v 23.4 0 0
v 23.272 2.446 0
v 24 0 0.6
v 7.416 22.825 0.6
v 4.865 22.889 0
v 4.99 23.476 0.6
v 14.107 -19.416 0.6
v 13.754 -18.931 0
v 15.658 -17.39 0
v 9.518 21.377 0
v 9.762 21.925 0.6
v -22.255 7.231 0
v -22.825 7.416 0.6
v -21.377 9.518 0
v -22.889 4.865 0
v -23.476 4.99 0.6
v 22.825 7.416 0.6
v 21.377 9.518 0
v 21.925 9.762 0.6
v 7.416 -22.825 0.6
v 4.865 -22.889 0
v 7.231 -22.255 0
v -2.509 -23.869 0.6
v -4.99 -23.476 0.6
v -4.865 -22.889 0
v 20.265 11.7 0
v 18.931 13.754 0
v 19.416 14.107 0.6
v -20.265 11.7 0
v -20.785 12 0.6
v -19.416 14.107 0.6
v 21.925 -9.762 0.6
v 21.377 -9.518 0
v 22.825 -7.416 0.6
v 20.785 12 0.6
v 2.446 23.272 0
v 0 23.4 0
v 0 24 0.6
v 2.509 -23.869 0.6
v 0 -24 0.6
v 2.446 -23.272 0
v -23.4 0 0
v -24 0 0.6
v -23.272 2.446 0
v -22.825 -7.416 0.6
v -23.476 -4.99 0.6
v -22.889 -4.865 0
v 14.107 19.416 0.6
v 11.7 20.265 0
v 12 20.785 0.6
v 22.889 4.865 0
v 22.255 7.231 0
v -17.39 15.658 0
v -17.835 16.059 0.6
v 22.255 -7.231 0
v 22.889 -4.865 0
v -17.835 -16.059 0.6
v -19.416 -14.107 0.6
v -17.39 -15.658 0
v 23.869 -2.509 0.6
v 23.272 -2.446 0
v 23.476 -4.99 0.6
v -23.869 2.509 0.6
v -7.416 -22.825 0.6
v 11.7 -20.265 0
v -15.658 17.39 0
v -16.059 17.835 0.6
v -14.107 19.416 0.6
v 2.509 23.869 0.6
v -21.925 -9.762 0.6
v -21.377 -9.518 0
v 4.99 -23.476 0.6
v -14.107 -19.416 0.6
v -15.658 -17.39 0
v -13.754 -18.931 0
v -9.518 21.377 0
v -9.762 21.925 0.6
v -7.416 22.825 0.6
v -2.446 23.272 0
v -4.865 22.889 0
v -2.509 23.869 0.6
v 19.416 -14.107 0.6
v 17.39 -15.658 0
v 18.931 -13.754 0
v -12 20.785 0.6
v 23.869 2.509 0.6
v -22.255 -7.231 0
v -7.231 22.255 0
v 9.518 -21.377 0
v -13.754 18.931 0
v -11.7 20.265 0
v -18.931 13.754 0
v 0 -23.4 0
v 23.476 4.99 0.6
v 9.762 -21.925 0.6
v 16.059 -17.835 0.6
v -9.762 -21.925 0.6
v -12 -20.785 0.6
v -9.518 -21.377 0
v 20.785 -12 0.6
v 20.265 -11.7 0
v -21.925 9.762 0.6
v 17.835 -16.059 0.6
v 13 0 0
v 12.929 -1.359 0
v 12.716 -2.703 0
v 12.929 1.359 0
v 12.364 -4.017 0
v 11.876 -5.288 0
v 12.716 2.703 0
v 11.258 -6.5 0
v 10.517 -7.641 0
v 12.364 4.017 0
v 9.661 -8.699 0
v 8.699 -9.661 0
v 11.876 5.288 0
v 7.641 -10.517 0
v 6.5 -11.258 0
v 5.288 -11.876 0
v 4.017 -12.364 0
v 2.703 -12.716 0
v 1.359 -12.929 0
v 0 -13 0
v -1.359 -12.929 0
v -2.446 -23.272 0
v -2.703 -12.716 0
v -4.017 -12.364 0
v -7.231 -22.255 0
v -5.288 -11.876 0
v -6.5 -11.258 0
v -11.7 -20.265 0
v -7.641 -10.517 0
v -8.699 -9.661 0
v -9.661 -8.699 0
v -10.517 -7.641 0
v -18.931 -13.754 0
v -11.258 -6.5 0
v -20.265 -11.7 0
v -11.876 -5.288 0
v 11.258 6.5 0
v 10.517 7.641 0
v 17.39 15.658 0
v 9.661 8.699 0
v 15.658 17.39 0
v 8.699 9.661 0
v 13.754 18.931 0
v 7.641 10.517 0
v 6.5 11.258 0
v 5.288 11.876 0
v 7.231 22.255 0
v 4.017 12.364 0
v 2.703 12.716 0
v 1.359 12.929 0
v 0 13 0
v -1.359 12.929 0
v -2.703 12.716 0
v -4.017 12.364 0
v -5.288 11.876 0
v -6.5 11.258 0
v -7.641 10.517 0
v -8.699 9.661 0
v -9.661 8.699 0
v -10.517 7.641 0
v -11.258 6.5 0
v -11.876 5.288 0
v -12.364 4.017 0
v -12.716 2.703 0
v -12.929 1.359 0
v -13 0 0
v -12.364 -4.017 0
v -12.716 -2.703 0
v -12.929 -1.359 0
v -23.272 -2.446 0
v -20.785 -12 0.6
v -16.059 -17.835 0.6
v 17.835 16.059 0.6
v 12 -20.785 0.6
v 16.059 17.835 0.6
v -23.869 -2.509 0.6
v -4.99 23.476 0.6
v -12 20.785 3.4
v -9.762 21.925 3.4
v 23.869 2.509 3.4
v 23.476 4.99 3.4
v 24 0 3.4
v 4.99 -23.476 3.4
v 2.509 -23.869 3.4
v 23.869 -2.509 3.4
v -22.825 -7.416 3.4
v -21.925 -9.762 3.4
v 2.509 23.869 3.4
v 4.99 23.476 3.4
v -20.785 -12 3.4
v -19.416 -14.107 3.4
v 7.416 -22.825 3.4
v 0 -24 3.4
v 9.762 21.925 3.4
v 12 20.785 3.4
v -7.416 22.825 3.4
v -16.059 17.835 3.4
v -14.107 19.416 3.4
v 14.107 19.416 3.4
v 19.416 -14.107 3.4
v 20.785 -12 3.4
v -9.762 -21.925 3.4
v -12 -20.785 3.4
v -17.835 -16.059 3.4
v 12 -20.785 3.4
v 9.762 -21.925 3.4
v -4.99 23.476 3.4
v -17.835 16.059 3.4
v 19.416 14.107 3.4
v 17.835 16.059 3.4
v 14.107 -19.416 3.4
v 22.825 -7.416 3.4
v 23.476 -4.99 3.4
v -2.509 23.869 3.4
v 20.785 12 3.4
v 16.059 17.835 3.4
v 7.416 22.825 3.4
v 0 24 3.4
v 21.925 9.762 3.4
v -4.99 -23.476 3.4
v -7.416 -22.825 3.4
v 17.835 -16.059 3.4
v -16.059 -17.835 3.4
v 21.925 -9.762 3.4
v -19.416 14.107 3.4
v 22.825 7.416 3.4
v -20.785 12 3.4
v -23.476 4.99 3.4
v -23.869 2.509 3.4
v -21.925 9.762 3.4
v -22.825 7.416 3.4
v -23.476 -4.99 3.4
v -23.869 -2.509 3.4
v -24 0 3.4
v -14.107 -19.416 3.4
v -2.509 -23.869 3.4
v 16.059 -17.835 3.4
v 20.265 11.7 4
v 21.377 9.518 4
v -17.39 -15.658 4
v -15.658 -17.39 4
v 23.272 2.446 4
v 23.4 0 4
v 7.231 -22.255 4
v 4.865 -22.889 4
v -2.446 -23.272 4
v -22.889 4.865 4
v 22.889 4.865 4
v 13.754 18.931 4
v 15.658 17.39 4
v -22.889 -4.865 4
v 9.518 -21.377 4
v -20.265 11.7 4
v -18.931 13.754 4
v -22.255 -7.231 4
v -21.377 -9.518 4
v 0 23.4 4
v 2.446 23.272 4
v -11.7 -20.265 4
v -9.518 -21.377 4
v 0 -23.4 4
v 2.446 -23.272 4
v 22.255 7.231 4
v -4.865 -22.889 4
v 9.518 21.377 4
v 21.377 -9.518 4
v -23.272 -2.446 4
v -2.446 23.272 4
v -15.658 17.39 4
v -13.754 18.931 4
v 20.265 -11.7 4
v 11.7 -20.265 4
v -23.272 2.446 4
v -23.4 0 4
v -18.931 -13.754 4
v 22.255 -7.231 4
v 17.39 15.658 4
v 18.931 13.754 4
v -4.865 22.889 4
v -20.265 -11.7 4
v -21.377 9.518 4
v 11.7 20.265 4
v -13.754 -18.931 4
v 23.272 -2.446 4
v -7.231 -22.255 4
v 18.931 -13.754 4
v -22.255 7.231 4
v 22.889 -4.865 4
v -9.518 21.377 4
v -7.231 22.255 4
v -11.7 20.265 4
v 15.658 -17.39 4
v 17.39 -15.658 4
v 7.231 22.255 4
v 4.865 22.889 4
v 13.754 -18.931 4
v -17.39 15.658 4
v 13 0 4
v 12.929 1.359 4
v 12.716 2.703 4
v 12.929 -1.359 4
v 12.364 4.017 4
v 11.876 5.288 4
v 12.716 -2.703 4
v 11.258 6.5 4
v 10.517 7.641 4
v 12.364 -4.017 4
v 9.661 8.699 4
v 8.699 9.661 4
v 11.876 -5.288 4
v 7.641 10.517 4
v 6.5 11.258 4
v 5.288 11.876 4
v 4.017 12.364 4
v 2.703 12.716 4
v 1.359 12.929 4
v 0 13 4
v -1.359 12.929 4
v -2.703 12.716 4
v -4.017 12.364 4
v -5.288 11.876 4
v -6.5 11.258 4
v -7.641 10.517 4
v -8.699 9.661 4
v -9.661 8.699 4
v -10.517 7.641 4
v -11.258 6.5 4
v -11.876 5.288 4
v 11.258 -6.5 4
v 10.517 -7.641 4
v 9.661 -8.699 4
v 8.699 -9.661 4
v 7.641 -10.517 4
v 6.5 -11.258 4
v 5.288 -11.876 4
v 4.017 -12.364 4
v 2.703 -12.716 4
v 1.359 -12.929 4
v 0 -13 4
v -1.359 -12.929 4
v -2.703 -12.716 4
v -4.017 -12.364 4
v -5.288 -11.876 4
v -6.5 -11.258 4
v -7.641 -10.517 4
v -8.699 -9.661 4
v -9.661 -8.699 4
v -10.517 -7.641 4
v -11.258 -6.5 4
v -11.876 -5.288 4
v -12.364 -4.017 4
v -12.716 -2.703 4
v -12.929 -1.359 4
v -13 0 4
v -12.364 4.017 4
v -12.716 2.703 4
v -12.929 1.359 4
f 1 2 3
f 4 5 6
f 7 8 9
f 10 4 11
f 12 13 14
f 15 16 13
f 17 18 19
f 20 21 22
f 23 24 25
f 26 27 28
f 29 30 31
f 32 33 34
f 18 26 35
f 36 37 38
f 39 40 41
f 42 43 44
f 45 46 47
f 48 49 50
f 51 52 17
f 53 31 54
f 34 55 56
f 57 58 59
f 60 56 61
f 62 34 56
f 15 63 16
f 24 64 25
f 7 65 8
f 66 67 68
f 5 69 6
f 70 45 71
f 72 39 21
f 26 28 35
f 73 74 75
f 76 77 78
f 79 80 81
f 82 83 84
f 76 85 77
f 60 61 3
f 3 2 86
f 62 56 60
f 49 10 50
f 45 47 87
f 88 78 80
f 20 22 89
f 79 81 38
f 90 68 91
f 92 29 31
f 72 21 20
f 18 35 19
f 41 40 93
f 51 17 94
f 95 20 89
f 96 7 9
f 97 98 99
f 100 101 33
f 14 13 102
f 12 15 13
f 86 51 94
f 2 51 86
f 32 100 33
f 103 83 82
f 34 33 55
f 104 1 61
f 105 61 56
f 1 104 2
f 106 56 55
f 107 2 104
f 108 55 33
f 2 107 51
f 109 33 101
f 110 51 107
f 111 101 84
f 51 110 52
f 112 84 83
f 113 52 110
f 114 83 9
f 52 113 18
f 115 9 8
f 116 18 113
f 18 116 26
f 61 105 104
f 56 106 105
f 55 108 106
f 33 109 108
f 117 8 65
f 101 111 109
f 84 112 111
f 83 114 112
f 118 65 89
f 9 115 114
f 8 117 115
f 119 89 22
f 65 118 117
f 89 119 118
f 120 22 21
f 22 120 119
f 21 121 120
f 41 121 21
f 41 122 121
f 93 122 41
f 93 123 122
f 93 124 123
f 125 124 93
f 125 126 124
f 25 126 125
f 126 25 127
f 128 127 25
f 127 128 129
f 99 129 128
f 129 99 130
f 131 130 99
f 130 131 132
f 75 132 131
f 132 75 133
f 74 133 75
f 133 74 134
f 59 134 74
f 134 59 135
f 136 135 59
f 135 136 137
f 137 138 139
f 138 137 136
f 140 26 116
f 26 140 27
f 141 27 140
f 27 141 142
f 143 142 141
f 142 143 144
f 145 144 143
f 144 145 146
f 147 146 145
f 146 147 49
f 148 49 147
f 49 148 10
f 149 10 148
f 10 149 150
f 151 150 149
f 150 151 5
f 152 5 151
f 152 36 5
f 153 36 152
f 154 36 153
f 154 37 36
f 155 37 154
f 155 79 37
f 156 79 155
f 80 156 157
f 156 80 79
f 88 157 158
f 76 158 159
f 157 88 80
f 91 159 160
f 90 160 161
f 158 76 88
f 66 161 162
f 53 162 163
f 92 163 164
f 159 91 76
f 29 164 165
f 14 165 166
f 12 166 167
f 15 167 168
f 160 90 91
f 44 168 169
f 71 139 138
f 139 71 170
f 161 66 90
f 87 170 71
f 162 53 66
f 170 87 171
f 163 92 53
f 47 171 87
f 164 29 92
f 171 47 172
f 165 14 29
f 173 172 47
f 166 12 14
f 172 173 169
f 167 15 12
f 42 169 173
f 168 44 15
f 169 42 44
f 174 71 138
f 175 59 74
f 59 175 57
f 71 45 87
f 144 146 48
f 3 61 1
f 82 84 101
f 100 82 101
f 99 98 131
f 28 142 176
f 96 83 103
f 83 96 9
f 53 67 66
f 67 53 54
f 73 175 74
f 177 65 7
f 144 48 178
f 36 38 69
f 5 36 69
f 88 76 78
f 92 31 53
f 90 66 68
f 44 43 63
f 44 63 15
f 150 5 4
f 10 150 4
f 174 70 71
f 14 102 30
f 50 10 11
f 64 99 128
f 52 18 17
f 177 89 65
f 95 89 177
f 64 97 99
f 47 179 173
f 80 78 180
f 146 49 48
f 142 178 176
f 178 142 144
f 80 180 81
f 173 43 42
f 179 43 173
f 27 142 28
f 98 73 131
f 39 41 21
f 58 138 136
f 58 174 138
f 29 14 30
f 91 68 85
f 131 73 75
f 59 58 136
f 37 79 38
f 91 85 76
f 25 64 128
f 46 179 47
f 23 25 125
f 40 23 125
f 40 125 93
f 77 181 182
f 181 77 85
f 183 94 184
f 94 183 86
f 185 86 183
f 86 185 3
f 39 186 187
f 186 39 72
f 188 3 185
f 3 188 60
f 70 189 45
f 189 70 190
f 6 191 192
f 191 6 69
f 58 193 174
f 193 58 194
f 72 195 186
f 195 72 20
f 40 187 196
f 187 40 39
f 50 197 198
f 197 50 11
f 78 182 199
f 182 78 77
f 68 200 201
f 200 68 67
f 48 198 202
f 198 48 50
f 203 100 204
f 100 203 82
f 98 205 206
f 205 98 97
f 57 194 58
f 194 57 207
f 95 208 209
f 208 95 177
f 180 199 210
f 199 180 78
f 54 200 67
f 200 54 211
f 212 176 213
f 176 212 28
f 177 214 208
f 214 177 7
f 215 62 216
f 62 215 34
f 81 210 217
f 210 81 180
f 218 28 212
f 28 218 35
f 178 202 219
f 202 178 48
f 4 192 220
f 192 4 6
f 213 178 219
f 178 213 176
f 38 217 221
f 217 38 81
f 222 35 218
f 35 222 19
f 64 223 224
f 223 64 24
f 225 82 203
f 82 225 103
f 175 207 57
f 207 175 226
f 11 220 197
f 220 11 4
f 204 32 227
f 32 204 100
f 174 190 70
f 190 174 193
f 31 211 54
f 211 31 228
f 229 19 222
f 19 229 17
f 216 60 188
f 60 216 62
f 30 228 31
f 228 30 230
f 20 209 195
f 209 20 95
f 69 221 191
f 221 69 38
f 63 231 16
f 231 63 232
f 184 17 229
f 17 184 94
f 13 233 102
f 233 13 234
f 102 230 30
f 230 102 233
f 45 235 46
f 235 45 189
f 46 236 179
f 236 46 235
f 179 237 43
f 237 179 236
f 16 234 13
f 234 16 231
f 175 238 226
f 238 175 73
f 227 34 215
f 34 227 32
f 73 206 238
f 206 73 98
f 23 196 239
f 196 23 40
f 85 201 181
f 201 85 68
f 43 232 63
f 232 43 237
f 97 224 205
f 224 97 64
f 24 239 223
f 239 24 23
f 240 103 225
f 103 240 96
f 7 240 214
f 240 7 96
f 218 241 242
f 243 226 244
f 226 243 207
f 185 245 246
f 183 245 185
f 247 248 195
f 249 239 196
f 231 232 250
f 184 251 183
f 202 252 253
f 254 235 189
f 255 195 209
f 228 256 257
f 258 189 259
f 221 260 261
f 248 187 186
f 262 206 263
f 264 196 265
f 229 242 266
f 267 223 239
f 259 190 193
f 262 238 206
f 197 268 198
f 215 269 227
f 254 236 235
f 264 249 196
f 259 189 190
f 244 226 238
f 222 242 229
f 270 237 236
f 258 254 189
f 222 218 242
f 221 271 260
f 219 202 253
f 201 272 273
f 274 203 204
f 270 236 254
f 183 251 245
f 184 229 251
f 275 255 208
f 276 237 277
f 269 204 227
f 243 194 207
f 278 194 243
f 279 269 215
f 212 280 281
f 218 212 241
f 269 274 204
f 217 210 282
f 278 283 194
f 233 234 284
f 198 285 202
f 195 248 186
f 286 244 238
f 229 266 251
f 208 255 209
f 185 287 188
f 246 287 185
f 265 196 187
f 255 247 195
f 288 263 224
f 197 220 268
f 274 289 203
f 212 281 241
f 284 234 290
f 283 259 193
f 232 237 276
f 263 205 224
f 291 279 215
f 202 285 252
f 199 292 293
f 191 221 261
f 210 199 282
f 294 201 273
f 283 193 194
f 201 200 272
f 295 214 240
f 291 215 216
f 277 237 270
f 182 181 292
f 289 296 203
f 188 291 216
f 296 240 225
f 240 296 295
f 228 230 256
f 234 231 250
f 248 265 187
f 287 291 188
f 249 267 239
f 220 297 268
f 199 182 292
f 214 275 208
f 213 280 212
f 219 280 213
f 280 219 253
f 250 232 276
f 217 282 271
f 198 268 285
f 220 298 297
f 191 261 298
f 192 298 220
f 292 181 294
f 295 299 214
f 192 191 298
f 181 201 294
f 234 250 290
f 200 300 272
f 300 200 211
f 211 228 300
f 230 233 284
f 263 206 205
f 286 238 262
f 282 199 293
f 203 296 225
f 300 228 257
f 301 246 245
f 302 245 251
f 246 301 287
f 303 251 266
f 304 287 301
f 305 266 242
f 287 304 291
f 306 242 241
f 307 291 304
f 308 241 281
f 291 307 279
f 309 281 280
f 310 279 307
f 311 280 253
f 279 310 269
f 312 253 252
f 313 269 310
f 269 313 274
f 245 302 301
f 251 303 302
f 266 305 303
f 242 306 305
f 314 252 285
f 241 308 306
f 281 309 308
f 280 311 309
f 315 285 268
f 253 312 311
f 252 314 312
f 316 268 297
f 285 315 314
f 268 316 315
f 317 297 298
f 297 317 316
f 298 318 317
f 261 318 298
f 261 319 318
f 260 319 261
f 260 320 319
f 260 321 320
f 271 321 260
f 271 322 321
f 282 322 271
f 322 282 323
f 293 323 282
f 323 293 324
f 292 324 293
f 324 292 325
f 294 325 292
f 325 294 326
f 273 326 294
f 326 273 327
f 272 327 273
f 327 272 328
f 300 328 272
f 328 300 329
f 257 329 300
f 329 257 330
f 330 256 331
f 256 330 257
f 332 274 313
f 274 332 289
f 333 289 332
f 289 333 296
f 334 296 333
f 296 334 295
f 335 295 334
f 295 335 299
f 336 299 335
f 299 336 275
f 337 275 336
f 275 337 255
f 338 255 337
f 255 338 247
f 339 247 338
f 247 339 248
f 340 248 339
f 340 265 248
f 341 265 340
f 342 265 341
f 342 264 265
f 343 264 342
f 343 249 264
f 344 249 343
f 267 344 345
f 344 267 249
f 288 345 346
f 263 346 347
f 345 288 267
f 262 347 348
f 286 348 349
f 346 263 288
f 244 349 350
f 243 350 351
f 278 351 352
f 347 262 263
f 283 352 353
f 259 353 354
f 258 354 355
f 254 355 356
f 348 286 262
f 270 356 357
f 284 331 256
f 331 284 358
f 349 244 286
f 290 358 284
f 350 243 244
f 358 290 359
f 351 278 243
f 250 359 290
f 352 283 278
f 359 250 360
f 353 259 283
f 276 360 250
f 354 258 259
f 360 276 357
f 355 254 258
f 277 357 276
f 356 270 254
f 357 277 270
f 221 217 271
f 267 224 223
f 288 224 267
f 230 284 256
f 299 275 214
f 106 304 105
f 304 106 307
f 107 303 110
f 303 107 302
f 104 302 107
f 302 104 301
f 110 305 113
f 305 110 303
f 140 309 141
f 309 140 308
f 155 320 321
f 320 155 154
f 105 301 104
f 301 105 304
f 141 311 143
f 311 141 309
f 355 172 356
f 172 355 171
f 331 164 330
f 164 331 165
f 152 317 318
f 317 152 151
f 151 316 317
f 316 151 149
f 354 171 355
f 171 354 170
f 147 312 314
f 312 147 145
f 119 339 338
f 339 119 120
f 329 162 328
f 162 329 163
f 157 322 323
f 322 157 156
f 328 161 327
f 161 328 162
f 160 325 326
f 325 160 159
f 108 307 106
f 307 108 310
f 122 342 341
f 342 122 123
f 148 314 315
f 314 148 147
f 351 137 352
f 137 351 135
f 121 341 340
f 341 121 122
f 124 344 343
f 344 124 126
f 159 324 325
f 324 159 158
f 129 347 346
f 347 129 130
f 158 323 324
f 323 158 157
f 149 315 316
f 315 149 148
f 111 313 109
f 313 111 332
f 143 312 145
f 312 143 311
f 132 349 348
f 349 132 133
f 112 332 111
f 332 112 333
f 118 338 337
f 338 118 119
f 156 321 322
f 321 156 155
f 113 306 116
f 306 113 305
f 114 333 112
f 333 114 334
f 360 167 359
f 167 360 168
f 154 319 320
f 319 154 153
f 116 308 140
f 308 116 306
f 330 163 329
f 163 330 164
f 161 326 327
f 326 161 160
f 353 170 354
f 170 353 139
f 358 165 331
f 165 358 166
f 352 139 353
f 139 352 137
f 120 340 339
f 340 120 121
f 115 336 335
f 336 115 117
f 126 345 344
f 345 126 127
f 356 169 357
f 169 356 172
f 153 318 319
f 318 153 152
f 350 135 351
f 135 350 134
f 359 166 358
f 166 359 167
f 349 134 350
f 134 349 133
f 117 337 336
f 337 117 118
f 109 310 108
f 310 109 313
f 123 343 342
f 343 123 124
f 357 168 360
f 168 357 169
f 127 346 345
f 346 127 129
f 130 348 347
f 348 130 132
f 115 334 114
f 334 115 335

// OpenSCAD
// Chamfered metric washer.
$fn = 60;
eps = 0.02;
inner_d = 26;
outer_d = 48;
thickness = 4;
chamfer = 0.6;
difference() {
    union() {
        cylinder(d1 = outer_d - 2 * chamfer, d2 = outer_d, h = chamfer);
        translate([0, 0, chamfer]) cylinder(d = outer_d, h = thickness - 2 * chamfer);
        translate([0, 0, thickness - chamfer]) cylinder(d1 = outer_d, d2 = outer_d - 2 * chamfer, h = chamfer);
    }
    translate([0, 0, -eps]) cylinder(d = inner_d, h = thickness + 2 * eps);
}
